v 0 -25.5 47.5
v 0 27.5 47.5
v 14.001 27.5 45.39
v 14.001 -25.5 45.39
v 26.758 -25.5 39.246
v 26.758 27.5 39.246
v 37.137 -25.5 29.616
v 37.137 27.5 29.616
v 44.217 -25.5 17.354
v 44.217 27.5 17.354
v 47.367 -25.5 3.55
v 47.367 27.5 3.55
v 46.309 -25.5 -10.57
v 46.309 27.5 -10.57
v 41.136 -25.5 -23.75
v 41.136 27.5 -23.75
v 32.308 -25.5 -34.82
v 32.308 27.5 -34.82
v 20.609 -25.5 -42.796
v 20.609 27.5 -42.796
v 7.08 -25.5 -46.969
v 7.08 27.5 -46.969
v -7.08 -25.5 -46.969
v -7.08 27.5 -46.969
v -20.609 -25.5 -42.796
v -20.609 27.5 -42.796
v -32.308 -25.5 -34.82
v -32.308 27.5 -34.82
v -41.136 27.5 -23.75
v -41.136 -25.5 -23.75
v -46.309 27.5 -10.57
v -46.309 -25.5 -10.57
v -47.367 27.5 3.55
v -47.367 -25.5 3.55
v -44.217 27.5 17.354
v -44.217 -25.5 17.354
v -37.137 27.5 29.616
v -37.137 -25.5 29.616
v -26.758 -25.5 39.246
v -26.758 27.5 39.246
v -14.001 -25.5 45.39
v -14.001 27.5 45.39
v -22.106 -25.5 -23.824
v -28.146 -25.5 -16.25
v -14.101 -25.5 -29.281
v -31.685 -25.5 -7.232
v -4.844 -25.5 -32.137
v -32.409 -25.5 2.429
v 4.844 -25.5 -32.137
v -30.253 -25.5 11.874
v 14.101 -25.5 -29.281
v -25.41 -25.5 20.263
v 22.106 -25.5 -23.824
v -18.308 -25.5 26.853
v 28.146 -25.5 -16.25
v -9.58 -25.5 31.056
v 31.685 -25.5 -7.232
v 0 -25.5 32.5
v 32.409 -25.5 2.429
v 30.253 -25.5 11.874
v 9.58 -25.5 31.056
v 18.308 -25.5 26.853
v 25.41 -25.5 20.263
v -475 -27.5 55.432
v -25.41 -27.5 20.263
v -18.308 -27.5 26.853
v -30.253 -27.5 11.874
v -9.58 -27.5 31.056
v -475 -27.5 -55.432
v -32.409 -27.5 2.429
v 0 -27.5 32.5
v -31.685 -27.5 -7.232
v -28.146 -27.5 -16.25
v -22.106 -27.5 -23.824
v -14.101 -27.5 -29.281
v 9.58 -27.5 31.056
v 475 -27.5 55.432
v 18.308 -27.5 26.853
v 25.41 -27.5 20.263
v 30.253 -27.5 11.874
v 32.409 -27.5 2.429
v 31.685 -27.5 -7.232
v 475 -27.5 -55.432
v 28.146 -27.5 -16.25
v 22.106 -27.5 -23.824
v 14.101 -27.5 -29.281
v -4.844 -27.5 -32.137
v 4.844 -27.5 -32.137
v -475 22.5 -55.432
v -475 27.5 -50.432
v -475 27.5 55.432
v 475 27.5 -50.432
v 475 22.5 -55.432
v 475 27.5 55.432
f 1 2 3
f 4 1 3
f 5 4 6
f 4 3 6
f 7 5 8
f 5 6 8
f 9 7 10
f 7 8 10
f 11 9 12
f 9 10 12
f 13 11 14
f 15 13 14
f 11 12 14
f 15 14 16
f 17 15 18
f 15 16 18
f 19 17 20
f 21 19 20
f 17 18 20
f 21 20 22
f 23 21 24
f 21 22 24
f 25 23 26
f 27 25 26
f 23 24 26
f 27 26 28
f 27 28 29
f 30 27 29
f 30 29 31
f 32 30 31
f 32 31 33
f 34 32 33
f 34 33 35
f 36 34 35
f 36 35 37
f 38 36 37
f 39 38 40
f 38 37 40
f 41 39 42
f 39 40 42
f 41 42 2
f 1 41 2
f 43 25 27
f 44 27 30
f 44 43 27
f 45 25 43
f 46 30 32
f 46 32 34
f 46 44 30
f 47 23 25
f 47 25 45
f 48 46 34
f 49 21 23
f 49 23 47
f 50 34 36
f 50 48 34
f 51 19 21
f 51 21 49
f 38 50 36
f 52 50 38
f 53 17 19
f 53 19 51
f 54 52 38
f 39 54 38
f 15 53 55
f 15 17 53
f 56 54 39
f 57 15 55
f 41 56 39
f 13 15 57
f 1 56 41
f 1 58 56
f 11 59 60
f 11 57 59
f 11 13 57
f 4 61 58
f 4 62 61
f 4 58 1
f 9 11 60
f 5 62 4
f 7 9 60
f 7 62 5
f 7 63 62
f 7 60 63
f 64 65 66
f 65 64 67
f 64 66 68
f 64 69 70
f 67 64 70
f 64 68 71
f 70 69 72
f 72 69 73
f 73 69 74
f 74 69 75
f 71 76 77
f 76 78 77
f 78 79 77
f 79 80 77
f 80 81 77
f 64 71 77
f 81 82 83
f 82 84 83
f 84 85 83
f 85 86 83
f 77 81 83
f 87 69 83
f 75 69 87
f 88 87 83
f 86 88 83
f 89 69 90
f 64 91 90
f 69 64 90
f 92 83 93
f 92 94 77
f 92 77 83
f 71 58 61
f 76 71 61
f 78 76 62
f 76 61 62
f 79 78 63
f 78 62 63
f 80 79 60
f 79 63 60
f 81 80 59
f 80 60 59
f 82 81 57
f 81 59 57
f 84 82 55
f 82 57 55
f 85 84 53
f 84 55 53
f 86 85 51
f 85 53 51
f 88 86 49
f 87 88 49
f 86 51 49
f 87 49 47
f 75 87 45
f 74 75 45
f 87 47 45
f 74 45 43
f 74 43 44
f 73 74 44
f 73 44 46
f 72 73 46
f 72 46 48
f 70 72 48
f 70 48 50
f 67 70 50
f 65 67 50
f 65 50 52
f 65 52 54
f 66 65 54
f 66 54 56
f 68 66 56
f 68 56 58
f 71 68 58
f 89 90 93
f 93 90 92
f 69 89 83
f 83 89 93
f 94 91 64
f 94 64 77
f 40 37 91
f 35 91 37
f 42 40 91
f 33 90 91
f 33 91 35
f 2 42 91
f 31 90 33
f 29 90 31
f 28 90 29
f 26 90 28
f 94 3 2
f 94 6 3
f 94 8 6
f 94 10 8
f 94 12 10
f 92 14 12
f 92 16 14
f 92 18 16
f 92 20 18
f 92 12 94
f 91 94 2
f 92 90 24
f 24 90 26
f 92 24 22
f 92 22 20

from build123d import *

# Parameters (mm, degrees)
SKETCH1_W           = 950
SKETCH1_H           = 110.864689034
BOSS_EXTRUDE1_DEPTH = 27.5
SKETCH2_R           = 47.5
CUT_EXTRUDE1_DEPTH  = 53
SKETCH3_R           = 32.5
CUT_EXTRUDE2_DEPTH  = 53
CHAMFER1_SIZE       = 5


with BuildPart() as part:
    # Sketch1 → Boss-Extrude1 (new, symmetric)
    with BuildSketch(Plane(origin=(0, 0, 0), x_dir=(1, 0, 0), z_dir=(0, 1, 0))):
        Rectangle(SKETCH1_W, SKETCH1_H)
    extrude(amount=BOSS_EXTRUDE1_DEPTH, both=True)

    # Sketch2 → Cut-Extrude1 (cut)
    with BuildSketch(Plane(origin=(0, 27.5, 0), x_dir=(1, 0, 0), z_dir=(0, 1, 0))):
        with Locations(Location((0, 0, 0), (0, 0, 270))):
            Circle(SKETCH2_R)
    extrude(amount=-CUT_EXTRUDE1_DEPTH, mode=Mode.SUBTRACT)

    # Sketch3 → Cut-Extrude2 (cut)
    with BuildSketch(Plane(origin=(0, -25.5, 0), x_dir=(1, 0, 0), z_dir=(0, 1, 0))):
        with Locations(Location((0, 0, 0), (0, 0, 270))):
            Circle(SKETCH3_R)
    extrude(amount=-CUT_EXTRUDE2_DEPTH, mode=Mode.SUBTRACT)

    # Chamfer1
    chamfer1_edges = [part.edges().sort_by_distance(p)[0] for p in [
        (0, 27.5, -55.432344517),
    ]]
    chamfer(chamfer1_edges, length=CHAMFER1_SIZE)


solid = part.part
